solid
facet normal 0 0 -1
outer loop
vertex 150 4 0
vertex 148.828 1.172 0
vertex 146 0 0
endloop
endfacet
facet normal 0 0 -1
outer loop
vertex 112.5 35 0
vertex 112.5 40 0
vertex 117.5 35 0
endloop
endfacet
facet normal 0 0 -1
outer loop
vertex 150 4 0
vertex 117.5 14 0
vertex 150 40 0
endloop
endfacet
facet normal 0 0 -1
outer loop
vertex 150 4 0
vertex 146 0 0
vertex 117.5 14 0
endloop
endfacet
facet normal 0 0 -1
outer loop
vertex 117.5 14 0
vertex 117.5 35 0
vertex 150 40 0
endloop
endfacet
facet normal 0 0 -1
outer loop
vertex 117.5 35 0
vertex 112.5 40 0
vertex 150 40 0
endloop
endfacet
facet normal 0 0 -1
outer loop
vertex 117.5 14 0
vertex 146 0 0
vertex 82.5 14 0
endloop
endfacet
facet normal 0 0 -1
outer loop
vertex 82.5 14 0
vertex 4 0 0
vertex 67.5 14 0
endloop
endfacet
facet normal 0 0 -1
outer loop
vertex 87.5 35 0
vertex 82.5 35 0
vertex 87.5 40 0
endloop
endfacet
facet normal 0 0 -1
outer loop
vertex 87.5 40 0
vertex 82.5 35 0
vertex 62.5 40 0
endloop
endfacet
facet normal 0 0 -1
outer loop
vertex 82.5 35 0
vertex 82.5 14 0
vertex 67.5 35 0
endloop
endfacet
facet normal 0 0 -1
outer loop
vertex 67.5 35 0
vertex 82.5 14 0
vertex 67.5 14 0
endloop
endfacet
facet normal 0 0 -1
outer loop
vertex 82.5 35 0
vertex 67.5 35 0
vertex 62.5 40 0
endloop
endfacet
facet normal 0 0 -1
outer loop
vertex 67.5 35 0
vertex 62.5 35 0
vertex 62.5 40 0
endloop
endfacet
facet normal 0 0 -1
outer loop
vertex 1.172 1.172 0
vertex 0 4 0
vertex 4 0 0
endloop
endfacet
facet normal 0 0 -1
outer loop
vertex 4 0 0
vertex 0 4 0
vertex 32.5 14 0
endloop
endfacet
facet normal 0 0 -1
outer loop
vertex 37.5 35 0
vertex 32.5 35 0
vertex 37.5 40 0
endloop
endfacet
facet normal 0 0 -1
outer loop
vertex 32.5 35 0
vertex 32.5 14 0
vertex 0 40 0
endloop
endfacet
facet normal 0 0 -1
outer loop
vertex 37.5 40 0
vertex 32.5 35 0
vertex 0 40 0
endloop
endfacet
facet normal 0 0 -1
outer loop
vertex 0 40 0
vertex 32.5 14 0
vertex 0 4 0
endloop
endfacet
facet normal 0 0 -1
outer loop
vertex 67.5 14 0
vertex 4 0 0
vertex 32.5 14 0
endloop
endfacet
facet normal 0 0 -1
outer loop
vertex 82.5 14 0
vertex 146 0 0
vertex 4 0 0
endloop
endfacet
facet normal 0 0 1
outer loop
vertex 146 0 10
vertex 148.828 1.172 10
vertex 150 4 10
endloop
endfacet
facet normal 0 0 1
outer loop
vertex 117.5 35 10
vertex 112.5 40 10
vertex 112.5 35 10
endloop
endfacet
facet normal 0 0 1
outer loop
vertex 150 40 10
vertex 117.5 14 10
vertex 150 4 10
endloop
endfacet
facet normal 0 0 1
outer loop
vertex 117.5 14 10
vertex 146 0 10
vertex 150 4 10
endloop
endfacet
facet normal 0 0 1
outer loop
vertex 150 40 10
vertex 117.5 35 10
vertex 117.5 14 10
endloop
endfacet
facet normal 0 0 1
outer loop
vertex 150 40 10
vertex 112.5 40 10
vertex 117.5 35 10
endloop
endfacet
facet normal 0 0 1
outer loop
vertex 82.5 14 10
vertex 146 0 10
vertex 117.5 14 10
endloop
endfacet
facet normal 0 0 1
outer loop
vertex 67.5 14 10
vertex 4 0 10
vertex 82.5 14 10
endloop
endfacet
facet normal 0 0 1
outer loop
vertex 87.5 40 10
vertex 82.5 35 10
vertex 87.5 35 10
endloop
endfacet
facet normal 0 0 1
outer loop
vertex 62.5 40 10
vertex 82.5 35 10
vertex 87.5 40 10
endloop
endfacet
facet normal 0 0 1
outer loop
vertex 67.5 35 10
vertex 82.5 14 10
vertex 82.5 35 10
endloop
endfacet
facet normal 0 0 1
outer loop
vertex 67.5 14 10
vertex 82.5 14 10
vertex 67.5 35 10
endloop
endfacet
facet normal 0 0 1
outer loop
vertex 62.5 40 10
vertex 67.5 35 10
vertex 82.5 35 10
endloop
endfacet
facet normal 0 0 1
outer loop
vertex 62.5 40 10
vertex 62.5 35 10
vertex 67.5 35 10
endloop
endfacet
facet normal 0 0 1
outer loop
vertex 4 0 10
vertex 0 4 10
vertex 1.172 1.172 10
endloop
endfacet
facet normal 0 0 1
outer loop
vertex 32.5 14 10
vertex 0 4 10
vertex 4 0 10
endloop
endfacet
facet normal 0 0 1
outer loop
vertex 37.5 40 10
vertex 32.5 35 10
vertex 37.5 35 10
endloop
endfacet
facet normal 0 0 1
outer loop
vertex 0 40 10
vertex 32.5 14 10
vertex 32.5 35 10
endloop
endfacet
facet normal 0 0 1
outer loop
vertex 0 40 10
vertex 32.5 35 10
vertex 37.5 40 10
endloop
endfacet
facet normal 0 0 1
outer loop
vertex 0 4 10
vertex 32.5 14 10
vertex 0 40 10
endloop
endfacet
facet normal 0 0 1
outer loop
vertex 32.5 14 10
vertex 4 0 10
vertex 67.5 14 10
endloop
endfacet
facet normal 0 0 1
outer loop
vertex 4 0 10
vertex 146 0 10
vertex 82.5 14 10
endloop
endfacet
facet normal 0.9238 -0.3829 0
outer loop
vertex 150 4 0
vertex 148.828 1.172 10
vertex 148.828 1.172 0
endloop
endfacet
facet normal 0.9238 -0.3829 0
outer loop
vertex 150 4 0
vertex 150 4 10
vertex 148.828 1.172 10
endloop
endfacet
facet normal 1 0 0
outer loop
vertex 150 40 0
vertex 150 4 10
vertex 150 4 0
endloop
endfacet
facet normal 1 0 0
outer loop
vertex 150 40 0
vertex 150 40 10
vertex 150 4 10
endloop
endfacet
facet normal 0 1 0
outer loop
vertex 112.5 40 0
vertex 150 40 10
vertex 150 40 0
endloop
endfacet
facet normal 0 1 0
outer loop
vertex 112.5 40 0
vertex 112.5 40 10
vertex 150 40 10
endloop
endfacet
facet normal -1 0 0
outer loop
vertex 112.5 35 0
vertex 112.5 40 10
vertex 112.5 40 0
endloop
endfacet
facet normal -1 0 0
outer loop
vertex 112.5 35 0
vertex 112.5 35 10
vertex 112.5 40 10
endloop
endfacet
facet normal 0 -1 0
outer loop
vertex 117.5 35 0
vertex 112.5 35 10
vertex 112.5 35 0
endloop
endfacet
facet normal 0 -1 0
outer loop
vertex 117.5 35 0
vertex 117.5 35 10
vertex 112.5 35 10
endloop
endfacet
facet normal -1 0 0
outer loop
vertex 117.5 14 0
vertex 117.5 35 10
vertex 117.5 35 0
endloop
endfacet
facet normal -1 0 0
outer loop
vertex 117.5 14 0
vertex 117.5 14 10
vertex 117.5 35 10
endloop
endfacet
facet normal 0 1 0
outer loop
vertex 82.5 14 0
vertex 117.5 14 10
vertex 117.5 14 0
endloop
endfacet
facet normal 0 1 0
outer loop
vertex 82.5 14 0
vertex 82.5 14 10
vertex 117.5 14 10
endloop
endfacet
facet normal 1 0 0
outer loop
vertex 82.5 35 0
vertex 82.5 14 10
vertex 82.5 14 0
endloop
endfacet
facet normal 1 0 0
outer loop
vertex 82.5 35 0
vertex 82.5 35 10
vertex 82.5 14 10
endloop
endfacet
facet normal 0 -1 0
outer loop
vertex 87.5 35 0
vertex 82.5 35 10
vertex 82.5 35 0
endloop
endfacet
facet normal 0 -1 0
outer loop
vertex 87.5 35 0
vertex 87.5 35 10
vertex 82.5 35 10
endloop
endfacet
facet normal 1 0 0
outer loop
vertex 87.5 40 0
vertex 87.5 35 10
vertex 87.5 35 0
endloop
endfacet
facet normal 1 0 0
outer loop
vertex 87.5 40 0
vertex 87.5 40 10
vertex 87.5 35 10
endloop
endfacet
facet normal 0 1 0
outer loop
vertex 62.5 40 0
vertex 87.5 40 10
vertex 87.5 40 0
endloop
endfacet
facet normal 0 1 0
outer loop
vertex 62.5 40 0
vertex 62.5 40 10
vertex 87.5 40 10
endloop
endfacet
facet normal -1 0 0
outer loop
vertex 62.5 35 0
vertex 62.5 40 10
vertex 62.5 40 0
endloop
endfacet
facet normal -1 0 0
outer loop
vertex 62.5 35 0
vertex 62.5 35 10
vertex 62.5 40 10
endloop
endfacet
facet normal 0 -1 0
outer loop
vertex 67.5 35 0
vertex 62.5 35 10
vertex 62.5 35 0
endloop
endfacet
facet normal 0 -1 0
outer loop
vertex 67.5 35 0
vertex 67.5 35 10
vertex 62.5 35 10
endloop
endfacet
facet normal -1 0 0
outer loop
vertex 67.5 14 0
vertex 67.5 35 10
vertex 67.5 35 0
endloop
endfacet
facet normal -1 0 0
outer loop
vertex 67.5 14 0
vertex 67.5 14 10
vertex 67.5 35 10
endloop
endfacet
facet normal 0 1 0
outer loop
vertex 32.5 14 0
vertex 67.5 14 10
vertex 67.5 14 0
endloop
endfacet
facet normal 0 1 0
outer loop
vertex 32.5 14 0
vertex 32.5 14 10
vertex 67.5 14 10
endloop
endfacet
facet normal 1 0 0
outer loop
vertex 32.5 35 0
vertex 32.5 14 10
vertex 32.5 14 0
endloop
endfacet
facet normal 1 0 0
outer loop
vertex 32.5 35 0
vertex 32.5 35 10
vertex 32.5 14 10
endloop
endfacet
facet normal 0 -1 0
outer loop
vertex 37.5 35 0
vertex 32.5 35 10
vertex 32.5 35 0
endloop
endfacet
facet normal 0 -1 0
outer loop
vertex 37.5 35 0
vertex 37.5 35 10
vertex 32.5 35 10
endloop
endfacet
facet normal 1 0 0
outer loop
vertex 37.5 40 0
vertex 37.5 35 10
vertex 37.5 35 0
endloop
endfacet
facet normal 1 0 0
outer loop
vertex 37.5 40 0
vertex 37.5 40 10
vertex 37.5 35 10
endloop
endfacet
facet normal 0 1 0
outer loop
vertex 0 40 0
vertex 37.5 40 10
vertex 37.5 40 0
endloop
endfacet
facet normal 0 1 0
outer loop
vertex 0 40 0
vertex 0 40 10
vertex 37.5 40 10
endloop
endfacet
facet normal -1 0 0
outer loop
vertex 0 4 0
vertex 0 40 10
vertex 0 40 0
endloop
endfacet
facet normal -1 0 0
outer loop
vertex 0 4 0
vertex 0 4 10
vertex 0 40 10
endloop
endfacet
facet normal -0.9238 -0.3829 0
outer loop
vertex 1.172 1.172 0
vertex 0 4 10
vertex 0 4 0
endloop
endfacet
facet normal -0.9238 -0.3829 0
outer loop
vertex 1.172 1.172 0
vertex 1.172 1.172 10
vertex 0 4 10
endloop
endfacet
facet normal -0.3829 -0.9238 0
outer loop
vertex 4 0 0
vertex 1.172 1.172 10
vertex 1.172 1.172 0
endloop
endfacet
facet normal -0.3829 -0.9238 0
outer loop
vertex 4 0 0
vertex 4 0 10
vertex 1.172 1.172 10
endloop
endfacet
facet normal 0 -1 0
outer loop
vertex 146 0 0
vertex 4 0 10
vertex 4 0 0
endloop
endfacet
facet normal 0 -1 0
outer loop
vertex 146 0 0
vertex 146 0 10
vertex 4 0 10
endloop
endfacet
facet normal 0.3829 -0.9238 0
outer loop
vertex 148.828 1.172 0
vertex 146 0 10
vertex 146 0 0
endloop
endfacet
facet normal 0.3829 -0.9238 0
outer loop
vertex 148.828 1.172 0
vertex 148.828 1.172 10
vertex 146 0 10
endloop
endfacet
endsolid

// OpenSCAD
$fn = 32;

// ----------------------------------------------------------------------
// Oversize slot bar: 150 mm bar with 2 oversize windows
// ----------------------------------------------------------------------

// --- parameters (mm) ---
profile_height = 10;      // extrusion height
profile_points = 24;      // points of the closed outline

profile = [[0, 4], [1.172, 1.172], [4, 0], [146, 0], [148.828, 1.172], [150, 4], [150, 40], [112.5, 40], [112.5, 35], [117.5, 35], [117.5, 14], [82.5, 14], [82.5, 35], [87.5, 35], [87.5, 40], [62.5, 40], [62.5, 35], [67.5, 35], [67.5, 14], [32.5, 14], [32.5, 35], [37.5, 35], [37.5, 40], [0, 40]];  // single closed polygon, 24 points, counter clockwise

// --- the one profile operation ---
linear_extrude(height = profile_height) polygon(points = profile);
